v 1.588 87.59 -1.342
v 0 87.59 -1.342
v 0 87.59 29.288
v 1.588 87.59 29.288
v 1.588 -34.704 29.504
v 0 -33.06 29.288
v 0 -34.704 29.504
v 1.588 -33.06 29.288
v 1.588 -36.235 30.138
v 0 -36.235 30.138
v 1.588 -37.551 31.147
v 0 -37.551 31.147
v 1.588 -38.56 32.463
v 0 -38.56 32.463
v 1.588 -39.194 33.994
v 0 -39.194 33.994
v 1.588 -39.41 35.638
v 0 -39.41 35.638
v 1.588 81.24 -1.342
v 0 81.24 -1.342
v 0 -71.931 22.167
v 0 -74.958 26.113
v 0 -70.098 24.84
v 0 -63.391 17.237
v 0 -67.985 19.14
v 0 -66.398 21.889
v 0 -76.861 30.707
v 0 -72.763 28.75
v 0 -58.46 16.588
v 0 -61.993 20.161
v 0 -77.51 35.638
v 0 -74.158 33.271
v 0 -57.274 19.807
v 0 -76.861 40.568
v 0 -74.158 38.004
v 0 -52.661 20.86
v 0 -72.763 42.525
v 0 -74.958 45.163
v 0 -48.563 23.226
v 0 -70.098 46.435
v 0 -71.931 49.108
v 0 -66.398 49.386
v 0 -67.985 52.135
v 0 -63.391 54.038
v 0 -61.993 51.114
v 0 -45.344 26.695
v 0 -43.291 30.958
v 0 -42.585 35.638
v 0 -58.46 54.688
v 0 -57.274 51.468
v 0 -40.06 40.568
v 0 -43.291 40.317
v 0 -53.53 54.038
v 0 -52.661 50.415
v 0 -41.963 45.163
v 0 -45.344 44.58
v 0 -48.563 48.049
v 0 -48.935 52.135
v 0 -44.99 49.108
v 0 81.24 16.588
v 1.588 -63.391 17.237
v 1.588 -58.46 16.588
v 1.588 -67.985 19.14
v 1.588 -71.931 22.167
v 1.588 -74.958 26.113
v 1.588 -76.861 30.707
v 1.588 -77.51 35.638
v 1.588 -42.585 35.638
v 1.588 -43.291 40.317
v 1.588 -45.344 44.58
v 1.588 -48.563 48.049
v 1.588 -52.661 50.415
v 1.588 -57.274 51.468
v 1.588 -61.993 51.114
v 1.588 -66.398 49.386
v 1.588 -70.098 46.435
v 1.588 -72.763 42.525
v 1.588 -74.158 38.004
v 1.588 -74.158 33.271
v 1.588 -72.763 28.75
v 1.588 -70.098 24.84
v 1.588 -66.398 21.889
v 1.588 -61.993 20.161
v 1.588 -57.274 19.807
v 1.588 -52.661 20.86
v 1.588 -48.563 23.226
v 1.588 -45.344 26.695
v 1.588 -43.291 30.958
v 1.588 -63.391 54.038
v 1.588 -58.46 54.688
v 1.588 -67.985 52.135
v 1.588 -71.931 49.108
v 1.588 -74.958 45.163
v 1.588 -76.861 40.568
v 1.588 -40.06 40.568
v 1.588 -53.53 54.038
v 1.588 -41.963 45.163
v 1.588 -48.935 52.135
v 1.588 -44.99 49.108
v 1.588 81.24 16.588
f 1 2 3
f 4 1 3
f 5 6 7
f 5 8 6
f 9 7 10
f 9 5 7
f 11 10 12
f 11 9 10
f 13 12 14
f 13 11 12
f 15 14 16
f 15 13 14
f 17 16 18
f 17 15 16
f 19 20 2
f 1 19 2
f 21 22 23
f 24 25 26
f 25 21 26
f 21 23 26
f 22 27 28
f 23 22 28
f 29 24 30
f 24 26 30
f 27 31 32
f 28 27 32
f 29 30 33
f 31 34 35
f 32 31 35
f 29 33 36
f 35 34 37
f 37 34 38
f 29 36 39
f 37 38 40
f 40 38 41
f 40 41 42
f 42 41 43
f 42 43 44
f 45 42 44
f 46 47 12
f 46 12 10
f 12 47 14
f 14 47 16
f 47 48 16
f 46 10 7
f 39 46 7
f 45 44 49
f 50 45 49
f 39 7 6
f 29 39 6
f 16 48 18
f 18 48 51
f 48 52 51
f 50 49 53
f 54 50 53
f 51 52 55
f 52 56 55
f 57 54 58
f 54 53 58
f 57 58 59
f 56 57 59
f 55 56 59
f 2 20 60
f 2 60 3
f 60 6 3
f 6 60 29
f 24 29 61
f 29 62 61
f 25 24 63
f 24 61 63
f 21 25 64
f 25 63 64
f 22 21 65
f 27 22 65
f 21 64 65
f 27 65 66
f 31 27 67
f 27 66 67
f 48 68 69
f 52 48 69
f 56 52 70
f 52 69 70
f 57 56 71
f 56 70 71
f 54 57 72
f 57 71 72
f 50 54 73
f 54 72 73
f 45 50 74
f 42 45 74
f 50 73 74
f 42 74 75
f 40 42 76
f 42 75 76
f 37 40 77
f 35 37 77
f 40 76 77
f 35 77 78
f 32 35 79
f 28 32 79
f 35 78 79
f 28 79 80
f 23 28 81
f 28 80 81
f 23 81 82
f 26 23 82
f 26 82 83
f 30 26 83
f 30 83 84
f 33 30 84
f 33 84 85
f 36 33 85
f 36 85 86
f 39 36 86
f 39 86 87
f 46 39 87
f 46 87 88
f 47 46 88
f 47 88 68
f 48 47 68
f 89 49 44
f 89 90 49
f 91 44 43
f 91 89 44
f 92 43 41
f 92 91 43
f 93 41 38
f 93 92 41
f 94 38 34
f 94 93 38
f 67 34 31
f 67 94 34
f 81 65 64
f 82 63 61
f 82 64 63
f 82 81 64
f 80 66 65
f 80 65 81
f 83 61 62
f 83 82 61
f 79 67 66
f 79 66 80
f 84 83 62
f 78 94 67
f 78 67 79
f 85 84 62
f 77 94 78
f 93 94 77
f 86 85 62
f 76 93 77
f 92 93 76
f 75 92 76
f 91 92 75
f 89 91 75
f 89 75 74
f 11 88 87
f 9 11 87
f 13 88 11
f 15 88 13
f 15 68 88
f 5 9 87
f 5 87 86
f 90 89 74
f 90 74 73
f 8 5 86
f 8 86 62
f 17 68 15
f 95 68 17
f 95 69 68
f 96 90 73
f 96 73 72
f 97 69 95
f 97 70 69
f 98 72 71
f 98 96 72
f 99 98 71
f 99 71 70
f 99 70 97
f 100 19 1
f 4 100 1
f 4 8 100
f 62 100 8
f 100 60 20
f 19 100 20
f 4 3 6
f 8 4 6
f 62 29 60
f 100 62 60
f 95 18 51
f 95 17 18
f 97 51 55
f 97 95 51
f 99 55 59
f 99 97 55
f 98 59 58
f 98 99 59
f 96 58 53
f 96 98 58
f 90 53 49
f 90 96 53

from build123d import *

# Parameters (mm, degrees)
F1_DEPTH = 1.5875
F2_R     = 19.04999
F3_R     = 6.35
F4_R     = 15.875
F5_DEPTH = 25.4


# Not quite as in the source:
# - a fillet or chamfer is up to 0.001 mm smaller than in the source, because OpenCascade refuses the exact size


with BuildPart() as f1:
    # F0 (on Right) → F1 (new body)
    with BuildSketch(Plane.YZ):
        Polygon((-77.51046875, 16.5875132085), (81.23953125, 16.5875132085), (81.23953125, -1.3419014323), (87.58953125, -1.3419014323), (87.58953125, 29.2875132085), (-39.41046875, 29.2875132085), (-39.41046875, 54.6875132085), (-77.51046875, 54.6875132085), align=None)
    extrude(amount=F1_DEPTH)

    # F2 (radius 19.05 in the source; OpenCascade refuses exactly that, so slightly less here)
    f2_edges = [f1.edges().sort_by_distance(p)[0] for p in [
        (0.79375, -77.510469, 54.687513),
        (0.79375, -77.510469, 16.587513),
        (0.79375, -39.410469, 54.687513),
    ]]
    fillet(f2_edges, radius=F2_R)

    # F3
    f3_edges = [f1.edges().sort_by_distance(p)[0] for p in [
        (0.79375, -39.410469, 29.287513),
    ]]
    fillet(f3_edges, radius=F3_R)

    # F4 (on face) → F5 (cut)
    with BuildSketch(Plane.YZ.offset(1.5875)):
        with Locations((-58.46046875, 35.6375132085)):
            Circle(F4_R)
    extrude(amount=-F5_DEPTH, mode=Mode.SUBTRACT)


solid = f1.part
